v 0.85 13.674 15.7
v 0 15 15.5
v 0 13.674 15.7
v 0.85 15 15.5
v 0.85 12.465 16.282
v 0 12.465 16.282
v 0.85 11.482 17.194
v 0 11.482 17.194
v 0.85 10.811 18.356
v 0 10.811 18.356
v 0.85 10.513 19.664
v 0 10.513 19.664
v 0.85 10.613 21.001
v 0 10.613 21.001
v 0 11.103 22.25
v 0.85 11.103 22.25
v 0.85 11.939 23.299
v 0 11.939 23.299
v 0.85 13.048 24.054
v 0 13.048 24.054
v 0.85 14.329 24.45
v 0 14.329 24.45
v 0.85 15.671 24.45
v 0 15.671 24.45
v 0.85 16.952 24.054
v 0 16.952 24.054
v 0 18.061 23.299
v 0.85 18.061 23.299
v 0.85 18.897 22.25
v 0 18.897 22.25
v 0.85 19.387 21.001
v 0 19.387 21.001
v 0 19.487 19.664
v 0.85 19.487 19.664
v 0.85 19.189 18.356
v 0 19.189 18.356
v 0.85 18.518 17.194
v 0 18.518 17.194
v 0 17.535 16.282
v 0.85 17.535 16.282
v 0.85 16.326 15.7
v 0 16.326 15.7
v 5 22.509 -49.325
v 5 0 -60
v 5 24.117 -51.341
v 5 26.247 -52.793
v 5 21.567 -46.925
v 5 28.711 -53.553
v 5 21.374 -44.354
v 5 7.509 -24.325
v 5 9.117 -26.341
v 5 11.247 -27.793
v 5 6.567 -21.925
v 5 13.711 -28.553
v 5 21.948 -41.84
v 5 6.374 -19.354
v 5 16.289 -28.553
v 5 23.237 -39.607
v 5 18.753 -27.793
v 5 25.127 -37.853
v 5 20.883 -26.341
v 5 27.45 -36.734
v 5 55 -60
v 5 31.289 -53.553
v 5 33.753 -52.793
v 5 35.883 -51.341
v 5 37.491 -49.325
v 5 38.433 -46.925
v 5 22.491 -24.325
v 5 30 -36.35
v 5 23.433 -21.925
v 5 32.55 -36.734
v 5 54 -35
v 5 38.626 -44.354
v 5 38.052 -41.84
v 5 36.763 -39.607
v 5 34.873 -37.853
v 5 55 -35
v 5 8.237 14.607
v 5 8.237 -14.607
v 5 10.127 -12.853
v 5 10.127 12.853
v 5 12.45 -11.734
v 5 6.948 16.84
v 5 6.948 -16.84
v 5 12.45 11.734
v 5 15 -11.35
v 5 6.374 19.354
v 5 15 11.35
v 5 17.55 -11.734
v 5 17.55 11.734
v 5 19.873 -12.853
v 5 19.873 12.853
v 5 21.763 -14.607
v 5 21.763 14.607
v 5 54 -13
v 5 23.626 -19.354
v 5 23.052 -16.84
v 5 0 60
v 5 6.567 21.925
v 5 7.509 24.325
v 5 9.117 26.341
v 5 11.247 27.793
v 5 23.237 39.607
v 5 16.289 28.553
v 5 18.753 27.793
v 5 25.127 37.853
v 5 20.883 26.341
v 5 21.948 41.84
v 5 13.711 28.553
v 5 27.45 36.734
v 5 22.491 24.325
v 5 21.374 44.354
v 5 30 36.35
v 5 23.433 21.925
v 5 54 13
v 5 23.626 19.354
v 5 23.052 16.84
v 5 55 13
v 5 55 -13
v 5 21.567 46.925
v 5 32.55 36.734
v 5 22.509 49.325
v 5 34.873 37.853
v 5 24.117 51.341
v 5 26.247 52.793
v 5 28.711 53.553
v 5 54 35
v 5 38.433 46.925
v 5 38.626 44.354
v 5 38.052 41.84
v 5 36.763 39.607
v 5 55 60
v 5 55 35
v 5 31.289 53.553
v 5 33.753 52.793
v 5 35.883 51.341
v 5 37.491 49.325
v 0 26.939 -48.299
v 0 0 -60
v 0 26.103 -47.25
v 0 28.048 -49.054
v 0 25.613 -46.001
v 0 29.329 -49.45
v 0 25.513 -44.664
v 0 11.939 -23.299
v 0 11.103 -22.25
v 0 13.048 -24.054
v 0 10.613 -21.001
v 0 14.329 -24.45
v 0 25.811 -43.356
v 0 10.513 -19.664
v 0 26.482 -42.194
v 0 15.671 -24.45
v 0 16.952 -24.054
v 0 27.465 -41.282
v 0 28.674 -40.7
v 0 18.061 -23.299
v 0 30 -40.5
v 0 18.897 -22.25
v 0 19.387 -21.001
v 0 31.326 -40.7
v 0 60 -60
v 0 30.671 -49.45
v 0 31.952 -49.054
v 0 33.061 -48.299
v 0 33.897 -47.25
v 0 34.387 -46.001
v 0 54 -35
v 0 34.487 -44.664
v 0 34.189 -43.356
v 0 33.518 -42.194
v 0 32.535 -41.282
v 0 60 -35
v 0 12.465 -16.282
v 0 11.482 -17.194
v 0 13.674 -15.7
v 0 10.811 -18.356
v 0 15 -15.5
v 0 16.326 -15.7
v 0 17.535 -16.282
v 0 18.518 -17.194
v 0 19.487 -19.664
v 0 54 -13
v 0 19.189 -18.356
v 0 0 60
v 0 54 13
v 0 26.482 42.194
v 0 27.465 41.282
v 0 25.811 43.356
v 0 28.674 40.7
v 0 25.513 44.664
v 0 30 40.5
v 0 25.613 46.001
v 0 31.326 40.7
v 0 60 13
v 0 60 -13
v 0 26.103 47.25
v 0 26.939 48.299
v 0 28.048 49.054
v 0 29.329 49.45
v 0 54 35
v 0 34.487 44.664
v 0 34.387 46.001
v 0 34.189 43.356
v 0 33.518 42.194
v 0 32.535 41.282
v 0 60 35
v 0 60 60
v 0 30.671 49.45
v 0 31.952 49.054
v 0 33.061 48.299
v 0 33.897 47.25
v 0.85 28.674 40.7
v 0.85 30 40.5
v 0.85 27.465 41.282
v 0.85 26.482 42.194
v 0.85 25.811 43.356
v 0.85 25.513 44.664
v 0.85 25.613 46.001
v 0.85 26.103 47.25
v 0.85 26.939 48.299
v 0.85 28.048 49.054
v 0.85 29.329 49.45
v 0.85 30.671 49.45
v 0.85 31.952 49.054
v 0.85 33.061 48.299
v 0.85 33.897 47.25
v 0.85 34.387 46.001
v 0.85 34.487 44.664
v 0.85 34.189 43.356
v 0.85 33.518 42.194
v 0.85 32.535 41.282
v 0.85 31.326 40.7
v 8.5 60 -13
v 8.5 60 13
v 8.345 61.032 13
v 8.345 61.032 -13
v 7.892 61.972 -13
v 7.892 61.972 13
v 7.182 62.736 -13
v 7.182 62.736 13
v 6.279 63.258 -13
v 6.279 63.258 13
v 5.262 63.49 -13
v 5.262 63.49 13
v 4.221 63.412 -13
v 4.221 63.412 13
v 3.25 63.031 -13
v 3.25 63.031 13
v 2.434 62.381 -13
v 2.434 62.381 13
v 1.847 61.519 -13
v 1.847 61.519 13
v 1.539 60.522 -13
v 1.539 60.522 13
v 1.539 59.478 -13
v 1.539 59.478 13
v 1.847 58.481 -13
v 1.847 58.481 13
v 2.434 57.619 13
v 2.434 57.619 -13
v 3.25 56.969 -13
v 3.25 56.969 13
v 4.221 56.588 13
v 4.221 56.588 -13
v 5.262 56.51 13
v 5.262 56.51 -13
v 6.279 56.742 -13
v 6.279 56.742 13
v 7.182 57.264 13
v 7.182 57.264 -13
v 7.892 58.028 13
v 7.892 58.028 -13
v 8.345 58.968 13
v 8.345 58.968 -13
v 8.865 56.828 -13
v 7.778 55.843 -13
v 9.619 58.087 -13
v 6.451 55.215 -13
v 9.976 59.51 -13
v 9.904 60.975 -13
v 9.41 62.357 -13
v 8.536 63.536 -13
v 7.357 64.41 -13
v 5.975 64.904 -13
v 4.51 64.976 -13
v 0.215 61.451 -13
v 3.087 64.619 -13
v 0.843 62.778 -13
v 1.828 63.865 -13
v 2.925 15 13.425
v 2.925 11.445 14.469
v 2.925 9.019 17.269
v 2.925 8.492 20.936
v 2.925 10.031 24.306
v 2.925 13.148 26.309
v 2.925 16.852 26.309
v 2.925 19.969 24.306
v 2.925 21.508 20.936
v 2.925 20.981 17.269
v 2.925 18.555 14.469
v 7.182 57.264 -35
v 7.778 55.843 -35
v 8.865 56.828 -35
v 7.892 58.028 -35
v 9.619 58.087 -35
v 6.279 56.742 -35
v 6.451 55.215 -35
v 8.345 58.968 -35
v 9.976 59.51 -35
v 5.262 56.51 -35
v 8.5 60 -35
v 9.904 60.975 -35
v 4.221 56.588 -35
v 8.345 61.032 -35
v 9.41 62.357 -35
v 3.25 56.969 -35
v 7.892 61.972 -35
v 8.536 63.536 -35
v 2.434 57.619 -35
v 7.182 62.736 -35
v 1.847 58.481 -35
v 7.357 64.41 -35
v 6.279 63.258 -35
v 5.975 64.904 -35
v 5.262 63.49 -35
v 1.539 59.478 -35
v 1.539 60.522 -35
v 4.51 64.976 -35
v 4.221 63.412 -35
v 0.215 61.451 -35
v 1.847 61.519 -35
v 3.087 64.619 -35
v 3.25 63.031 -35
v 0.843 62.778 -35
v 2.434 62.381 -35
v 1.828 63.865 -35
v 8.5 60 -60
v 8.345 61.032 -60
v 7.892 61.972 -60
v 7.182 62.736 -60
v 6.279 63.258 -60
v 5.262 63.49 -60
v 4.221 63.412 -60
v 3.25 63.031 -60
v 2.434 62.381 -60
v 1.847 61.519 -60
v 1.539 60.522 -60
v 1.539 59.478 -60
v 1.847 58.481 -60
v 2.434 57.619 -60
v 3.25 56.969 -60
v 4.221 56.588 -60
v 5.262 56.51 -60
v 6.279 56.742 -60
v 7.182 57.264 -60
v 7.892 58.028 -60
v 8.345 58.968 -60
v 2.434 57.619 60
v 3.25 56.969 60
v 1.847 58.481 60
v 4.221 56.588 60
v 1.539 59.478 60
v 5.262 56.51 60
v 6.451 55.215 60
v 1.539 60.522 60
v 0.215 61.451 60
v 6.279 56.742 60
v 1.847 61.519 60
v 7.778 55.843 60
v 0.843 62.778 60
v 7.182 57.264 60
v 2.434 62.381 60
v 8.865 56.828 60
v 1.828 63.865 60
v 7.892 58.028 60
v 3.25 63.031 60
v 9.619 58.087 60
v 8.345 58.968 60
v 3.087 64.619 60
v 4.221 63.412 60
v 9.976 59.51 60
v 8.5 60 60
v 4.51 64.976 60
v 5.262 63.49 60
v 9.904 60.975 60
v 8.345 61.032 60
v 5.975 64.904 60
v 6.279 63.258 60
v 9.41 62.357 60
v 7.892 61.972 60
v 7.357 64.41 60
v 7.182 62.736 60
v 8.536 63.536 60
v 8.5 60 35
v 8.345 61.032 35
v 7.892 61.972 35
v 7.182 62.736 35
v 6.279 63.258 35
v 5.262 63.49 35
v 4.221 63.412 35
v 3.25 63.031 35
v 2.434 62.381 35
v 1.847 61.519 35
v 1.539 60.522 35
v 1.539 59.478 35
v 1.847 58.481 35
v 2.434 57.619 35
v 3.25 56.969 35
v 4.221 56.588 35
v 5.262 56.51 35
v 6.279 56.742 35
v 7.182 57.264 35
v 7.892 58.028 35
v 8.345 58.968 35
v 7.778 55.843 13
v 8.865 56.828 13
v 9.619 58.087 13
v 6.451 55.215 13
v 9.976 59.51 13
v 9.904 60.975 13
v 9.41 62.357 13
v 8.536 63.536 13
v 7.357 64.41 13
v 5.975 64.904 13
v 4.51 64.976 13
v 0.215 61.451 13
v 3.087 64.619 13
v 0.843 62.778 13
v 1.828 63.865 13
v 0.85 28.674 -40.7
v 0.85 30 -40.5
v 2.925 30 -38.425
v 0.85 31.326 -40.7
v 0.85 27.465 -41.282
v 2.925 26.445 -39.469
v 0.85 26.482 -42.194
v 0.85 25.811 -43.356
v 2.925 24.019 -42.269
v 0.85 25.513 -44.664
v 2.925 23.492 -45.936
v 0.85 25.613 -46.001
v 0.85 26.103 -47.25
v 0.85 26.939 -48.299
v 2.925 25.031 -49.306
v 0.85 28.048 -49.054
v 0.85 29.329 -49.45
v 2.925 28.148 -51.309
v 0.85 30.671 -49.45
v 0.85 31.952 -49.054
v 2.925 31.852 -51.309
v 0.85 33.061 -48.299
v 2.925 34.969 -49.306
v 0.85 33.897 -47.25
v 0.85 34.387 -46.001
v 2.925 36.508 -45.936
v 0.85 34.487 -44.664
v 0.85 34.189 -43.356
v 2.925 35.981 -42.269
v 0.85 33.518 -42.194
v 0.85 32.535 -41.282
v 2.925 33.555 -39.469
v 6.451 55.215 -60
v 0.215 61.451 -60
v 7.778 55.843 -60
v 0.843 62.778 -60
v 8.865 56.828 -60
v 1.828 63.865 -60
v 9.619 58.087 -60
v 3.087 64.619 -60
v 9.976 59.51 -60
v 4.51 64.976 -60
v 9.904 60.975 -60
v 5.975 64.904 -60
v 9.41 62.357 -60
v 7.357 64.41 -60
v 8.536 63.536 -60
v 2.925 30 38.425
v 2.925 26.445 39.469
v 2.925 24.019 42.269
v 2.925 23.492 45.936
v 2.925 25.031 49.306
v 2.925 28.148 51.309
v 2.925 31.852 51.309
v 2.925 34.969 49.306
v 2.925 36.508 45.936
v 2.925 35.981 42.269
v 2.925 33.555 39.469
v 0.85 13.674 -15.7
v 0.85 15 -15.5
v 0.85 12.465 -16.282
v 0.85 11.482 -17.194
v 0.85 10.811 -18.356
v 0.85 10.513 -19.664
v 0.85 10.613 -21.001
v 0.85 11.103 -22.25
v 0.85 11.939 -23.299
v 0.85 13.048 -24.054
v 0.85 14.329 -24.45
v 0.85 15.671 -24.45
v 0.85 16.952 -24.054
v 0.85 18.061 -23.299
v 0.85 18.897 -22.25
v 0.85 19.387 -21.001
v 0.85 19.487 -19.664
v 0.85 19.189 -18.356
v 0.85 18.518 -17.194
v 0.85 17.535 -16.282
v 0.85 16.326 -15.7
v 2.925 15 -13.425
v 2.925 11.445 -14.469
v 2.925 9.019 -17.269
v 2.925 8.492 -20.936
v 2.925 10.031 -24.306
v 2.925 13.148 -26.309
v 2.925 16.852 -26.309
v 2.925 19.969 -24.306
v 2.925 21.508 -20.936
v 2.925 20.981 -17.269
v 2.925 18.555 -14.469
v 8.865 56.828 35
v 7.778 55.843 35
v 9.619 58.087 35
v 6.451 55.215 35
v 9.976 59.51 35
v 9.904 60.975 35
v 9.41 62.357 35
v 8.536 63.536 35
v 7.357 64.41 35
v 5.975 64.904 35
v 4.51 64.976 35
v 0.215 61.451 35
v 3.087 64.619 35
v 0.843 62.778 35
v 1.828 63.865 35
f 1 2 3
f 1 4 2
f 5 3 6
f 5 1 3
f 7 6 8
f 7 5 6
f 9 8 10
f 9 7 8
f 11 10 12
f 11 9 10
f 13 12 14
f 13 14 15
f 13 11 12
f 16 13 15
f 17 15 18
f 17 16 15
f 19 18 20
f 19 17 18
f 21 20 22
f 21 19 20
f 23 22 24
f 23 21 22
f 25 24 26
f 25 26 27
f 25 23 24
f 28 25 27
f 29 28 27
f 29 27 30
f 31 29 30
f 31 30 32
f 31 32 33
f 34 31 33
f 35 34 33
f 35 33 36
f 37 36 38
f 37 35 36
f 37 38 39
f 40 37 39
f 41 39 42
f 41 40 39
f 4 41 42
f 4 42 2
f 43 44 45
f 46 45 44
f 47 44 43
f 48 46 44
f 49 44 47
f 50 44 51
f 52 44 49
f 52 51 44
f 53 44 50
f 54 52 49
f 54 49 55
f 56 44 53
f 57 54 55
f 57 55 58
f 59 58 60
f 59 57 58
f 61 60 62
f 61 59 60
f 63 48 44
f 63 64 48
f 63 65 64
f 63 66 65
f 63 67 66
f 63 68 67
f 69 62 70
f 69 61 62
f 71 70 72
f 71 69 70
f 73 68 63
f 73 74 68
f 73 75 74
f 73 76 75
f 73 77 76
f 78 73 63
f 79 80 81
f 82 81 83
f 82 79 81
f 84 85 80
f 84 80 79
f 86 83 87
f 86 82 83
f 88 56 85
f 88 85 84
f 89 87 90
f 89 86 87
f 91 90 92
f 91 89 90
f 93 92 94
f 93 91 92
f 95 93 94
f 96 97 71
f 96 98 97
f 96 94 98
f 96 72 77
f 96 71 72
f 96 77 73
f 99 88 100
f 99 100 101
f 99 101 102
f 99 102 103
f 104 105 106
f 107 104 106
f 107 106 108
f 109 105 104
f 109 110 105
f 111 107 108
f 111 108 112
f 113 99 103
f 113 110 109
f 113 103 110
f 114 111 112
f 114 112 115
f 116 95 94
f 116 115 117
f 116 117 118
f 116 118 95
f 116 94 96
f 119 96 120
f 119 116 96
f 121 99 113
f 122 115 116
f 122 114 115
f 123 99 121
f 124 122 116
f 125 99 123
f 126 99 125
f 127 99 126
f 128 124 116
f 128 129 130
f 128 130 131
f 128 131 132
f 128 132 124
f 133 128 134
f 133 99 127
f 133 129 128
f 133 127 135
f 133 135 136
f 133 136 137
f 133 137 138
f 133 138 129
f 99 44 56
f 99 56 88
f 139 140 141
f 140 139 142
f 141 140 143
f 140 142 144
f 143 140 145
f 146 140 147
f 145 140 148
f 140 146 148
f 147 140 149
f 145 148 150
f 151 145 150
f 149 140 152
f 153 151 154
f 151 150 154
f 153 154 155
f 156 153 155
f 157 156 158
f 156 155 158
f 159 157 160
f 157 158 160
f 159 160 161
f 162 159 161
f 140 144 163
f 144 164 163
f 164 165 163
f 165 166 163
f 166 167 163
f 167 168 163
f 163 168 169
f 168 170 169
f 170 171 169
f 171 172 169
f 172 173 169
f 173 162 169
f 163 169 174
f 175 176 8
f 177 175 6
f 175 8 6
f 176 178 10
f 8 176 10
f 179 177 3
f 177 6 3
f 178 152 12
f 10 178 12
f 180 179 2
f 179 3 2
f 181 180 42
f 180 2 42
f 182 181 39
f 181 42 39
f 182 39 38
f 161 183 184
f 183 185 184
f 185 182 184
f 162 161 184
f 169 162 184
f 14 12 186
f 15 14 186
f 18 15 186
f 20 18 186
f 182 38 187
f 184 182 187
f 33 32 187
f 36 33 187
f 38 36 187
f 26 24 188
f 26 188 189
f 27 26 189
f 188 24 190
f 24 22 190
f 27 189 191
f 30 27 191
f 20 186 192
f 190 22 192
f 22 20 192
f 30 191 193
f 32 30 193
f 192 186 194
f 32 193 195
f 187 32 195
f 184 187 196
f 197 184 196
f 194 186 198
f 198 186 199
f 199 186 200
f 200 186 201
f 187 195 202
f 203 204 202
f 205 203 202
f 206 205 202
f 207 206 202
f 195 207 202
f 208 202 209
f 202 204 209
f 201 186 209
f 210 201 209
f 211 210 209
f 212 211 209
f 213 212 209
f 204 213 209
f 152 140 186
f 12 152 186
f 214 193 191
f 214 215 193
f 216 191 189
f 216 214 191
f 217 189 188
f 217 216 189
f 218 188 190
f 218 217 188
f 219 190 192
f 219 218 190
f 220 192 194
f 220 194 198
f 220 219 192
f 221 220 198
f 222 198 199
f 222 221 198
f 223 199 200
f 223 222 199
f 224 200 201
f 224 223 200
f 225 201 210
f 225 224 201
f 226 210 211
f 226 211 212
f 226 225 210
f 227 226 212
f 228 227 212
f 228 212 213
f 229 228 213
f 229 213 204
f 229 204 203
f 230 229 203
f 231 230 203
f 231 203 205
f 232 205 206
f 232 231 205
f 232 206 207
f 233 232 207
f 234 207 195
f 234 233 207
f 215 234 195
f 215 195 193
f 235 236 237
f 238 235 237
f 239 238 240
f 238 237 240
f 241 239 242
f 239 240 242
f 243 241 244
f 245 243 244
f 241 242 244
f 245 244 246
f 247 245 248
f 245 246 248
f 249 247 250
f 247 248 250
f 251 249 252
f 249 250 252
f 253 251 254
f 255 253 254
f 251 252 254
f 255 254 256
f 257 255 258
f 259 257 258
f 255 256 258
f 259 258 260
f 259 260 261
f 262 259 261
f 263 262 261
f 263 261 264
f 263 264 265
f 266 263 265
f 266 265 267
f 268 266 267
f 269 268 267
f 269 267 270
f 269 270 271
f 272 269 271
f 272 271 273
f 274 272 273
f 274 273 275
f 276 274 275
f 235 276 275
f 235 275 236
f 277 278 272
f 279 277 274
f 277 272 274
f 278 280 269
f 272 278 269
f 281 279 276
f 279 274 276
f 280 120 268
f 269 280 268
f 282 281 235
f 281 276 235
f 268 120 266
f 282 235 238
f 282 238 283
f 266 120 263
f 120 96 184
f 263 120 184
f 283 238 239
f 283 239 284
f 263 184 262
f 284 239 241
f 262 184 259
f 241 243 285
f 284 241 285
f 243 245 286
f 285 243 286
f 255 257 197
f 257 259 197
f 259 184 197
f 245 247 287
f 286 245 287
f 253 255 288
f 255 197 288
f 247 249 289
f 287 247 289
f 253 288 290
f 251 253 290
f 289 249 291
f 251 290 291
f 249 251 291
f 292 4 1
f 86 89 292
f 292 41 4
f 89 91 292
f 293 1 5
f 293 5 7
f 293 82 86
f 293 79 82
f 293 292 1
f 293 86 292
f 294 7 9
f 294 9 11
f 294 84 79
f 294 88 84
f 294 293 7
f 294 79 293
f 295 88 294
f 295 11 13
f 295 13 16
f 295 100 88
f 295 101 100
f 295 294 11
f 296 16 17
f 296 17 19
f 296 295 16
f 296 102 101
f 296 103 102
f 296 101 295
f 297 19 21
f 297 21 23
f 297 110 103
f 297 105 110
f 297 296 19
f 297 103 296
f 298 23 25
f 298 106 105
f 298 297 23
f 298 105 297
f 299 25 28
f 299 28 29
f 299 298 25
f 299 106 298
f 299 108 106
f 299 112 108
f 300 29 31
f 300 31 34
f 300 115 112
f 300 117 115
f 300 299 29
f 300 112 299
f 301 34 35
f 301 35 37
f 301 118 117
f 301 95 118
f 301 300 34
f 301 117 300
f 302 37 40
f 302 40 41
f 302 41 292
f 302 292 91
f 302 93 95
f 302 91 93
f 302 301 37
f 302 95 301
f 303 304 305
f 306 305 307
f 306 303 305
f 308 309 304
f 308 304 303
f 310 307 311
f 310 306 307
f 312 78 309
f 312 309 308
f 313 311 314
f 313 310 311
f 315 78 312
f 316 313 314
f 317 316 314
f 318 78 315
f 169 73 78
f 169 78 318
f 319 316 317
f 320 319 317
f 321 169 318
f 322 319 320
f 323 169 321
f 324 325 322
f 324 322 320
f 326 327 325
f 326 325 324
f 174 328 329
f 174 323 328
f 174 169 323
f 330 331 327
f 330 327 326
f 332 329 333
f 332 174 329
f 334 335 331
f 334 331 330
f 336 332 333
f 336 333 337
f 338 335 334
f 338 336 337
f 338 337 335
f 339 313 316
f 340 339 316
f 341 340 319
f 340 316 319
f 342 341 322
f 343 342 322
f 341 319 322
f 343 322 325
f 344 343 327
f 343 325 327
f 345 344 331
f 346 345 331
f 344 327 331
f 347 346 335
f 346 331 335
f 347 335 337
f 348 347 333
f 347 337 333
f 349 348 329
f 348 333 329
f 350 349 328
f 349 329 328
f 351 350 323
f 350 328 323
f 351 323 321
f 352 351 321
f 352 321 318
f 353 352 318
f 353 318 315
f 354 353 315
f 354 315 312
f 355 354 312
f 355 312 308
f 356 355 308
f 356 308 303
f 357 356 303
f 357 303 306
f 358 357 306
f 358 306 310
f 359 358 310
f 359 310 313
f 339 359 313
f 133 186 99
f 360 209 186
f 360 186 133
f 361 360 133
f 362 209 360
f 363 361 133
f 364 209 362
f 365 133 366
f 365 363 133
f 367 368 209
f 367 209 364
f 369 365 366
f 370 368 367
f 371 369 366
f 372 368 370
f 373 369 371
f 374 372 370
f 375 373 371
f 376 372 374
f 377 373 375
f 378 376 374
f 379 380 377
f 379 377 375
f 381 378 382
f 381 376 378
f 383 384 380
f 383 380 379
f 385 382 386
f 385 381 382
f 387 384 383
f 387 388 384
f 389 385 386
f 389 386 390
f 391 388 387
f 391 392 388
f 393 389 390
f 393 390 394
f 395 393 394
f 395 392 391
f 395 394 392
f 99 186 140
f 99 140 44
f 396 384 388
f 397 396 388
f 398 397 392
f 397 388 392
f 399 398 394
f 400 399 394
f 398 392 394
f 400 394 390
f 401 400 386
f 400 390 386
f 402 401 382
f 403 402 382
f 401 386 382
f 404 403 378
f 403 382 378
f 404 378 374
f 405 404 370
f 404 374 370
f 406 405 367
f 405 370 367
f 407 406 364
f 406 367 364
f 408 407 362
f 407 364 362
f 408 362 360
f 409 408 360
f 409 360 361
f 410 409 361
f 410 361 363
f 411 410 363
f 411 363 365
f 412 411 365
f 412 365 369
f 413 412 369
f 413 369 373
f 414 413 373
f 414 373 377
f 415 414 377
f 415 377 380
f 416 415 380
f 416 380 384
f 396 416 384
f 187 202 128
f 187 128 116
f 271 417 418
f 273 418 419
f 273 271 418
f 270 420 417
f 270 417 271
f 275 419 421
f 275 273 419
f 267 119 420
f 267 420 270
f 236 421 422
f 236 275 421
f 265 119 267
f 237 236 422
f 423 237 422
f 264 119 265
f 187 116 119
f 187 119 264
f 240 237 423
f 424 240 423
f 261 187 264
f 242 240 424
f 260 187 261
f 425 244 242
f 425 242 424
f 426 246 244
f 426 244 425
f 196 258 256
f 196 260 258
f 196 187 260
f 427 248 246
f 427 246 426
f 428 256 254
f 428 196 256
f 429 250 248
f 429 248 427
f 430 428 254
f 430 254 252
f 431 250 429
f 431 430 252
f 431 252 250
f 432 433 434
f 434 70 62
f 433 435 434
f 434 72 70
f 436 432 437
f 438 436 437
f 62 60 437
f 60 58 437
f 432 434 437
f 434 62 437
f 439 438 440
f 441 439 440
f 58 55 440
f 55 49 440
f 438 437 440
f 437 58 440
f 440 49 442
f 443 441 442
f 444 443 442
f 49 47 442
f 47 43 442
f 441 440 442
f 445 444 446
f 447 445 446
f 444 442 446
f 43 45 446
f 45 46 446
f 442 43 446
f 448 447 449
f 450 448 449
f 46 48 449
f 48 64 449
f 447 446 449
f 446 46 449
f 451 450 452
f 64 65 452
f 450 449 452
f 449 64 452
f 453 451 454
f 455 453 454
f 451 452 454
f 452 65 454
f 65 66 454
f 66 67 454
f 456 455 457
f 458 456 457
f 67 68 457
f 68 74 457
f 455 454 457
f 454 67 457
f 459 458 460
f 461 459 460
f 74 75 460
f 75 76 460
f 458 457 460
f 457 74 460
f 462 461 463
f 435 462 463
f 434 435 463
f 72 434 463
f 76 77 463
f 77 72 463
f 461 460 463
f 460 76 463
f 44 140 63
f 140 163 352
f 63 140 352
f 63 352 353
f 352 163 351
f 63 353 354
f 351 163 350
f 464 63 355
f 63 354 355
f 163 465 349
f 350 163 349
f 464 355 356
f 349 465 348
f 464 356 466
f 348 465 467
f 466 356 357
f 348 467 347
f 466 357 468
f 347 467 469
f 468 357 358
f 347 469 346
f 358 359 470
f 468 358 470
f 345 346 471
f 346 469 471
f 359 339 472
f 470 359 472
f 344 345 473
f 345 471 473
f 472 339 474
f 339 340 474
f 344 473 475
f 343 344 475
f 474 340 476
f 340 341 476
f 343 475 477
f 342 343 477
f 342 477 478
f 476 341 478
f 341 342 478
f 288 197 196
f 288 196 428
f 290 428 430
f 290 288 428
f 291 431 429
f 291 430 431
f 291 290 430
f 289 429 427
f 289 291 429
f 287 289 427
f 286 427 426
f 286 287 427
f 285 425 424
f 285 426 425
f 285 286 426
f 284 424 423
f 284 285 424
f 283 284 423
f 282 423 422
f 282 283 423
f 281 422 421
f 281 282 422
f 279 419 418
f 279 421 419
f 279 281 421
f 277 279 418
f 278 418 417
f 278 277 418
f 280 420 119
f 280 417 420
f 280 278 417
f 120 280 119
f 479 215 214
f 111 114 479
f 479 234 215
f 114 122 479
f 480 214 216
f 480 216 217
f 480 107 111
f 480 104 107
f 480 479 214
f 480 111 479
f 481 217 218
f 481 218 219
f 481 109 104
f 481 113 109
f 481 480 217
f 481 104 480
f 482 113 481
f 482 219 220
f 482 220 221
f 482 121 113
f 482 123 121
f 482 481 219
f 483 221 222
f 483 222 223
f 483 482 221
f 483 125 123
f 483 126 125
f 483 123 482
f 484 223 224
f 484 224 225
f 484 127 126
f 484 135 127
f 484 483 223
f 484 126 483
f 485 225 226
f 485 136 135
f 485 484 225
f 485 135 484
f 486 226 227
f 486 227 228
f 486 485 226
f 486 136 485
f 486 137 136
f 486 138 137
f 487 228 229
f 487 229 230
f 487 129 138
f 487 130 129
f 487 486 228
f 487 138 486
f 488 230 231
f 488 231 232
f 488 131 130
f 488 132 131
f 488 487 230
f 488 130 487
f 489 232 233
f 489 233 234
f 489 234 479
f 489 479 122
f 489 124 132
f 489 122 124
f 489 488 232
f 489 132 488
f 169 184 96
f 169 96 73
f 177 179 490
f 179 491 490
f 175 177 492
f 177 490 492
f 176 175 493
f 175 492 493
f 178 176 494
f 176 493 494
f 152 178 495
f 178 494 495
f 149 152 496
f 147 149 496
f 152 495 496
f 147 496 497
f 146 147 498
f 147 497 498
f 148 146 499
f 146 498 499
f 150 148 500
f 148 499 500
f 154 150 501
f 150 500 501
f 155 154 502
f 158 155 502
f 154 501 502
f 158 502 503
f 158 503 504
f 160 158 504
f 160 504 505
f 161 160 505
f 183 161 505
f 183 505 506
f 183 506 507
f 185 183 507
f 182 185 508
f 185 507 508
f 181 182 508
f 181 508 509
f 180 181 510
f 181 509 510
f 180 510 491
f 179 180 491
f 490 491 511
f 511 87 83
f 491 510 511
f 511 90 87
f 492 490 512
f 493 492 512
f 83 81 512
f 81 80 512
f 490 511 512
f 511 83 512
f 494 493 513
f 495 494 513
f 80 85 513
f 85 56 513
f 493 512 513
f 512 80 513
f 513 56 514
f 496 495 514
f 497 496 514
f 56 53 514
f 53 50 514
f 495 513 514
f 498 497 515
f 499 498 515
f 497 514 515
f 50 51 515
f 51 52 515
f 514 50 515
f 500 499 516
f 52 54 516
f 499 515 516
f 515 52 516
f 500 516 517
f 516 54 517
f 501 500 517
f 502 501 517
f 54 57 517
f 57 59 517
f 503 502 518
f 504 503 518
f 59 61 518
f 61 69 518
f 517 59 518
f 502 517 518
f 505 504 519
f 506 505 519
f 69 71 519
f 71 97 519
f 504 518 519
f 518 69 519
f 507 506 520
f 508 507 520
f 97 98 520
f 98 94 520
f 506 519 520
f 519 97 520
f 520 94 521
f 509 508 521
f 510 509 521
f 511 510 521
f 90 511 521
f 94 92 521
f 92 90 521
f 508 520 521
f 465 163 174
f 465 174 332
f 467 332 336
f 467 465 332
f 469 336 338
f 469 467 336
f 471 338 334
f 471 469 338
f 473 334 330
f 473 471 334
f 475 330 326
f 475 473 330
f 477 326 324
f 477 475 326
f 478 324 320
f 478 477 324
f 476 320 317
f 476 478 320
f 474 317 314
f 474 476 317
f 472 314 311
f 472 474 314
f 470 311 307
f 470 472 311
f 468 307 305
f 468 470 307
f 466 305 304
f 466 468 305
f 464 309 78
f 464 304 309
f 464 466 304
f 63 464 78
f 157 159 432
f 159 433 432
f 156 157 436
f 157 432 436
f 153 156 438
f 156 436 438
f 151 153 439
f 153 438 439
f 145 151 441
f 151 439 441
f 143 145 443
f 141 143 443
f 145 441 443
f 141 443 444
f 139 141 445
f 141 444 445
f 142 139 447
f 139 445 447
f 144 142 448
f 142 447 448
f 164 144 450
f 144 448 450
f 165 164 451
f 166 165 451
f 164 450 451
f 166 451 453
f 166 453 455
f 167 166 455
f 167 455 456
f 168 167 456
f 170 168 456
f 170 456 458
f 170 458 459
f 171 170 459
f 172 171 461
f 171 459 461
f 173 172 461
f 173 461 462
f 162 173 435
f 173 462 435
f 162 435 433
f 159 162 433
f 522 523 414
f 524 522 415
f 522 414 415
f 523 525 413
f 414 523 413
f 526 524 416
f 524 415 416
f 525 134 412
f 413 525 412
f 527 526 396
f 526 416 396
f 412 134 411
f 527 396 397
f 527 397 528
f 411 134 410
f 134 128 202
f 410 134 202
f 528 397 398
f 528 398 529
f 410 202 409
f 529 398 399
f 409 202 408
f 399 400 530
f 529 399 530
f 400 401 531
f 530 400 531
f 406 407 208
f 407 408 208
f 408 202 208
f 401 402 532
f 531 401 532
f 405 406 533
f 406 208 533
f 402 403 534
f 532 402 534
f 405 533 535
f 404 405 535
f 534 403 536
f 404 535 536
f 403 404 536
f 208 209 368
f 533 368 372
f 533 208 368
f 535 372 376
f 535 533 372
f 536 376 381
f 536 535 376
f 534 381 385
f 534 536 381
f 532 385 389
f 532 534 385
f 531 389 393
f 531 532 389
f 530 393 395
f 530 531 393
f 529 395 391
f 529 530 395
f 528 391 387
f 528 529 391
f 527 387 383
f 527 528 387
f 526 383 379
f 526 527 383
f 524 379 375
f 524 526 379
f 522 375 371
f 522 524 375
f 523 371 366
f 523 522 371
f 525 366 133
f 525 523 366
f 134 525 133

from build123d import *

# Parameters (mm, degrees)
SKETCH_1_W                 = 5
SKETCH_1_H                 = 60
EXTRUDE_1_DEPTH            = 60
SKETCH_2_R                 = 5
SKETCH_4_R                 = 3.5
CUT_EXTRUDE_1_DEPTH        = 137.839321834
HOLE_WIZARD_M81_AT_2_COUNT = 2
HOLE_WIZARD_M81_AT_2_PITCH = 29.154759474
CUT_EXTRUDE_3_DEPTH        = 89.600225733
CUT_EXTRUDE_3_DEPTH_BACK   = 89.600225733
SKETCH_8_W                 = 22
SKETCH_8_H                 = 11


with BuildPart() as part:
    # Эскиз1 → Вытянуть-Тонкостенный1 (new, symmetric)
    with BuildSketch(Plane.XY):
        with Locations((2.5, 30)):
            Rectangle(SKETCH_1_W, SKETCH_1_H)
    extrude(amount=EXTRUDE_1_DEPTH, both=True)

    # По траектории1: sweep along a curve in space
    with BuildLine() as sweep_1_path:
        Line((5, 60, 60), (5, 60, -60))
    # Эскиз2 → По траектории1 (sweep)
    with BuildSketch(Plane.XY.offset(60)):
        with Locations((5, 60)):
            Circle(SKETCH_2_R)
    sweep(path=sweep_1_path.line)

    # Эскиз4 → Вырез-Вытянуть1 (cut, through all)
    with BuildSketch(Plane.XY.offset(60)):
        with Locations((5, 60)):
            Circle(SKETCH_4_R)
    extrude(amount=-CUT_EXTRUDE_1_DEPTH, mode=Mode.SUBTRACT)

    # Эскиз5 → Зенковка для  винта с плоской головкой M81 (revolve, cut)
    with BuildSketch(Plane(origin=(5, 30, 45), x_dir=(0, 0, -1), z_dir=(0, 1, 0))):
        Polygon((0, 0), (0, 5), (4.5, 5), (4.5, 4.15), (8.65, 0), align=None)
    hole_wizard_m81 = revolve(axis=Axis((11.35, 30, 45), (-1, 0, 0)), mode=Mode.SUBTRACT)

    # Зенковка для  винта с плоской головкой M81 at 2: Зенковка для  винта с плоской головкой M81 ×2
    with Locations(*[Vector(0, -0.5144957554275265, -0.8574929257125442) * (i * HOLE_WIZARD_M81_AT_2_PITCH) for i in range(1, HOLE_WIZARD_M81_AT_2_COUNT)]):
        add(hole_wizard_m81, mode=Mode.SUBTRACT)

    # Зеркальное отражение1: Зенковка для  винта с плоской головкой M81 across plane
    add(hole_wizard_m81.mirror(Plane.XY), mode=Mode.SUBTRACT)

    # Зеркальное отражение1 copy 1 sketch → Зеркальное отражение1 copy 1 (revolve, cut)
    with BuildSketch(Plane(origin=(5, 15, -20), x_dir=(0, 0, 1), z_dir=(0, 1, 0))):
        Polygon((0, 0), (0, -5), (4.5, -5), (4.5, -4.15), (8.65, 0), align=None)
    revolve(axis=Axis((11.35, 15, -20), (1, 0, 0)), mode=Mode.SUBTRACT)

    # Эскиз8 → Вырез-Вытянуть3 (cut, two sides: drawn at the far end of the back side and taken through both)
    with BuildSketch(Plane(origin=(5, 0, 0), x_dir=(0, 0, -1), z_dir=(1, 0, 0)).offset(-CUT_EXTRUDE_3_DEPTH_BACK)):
        with Locations((-24, 59.5)):
            Rectangle(SKETCH_8_W, SKETCH_8_H)
        with Locations((24, 59.5)):
            Rectangle(SKETCH_8_W, SKETCH_8_H)
    extrude(amount=CUT_EXTRUDE_3_DEPTH + CUT_EXTRUDE_3_DEPTH_BACK, mode=Mode.SUBTRACT)


solid = part.part
